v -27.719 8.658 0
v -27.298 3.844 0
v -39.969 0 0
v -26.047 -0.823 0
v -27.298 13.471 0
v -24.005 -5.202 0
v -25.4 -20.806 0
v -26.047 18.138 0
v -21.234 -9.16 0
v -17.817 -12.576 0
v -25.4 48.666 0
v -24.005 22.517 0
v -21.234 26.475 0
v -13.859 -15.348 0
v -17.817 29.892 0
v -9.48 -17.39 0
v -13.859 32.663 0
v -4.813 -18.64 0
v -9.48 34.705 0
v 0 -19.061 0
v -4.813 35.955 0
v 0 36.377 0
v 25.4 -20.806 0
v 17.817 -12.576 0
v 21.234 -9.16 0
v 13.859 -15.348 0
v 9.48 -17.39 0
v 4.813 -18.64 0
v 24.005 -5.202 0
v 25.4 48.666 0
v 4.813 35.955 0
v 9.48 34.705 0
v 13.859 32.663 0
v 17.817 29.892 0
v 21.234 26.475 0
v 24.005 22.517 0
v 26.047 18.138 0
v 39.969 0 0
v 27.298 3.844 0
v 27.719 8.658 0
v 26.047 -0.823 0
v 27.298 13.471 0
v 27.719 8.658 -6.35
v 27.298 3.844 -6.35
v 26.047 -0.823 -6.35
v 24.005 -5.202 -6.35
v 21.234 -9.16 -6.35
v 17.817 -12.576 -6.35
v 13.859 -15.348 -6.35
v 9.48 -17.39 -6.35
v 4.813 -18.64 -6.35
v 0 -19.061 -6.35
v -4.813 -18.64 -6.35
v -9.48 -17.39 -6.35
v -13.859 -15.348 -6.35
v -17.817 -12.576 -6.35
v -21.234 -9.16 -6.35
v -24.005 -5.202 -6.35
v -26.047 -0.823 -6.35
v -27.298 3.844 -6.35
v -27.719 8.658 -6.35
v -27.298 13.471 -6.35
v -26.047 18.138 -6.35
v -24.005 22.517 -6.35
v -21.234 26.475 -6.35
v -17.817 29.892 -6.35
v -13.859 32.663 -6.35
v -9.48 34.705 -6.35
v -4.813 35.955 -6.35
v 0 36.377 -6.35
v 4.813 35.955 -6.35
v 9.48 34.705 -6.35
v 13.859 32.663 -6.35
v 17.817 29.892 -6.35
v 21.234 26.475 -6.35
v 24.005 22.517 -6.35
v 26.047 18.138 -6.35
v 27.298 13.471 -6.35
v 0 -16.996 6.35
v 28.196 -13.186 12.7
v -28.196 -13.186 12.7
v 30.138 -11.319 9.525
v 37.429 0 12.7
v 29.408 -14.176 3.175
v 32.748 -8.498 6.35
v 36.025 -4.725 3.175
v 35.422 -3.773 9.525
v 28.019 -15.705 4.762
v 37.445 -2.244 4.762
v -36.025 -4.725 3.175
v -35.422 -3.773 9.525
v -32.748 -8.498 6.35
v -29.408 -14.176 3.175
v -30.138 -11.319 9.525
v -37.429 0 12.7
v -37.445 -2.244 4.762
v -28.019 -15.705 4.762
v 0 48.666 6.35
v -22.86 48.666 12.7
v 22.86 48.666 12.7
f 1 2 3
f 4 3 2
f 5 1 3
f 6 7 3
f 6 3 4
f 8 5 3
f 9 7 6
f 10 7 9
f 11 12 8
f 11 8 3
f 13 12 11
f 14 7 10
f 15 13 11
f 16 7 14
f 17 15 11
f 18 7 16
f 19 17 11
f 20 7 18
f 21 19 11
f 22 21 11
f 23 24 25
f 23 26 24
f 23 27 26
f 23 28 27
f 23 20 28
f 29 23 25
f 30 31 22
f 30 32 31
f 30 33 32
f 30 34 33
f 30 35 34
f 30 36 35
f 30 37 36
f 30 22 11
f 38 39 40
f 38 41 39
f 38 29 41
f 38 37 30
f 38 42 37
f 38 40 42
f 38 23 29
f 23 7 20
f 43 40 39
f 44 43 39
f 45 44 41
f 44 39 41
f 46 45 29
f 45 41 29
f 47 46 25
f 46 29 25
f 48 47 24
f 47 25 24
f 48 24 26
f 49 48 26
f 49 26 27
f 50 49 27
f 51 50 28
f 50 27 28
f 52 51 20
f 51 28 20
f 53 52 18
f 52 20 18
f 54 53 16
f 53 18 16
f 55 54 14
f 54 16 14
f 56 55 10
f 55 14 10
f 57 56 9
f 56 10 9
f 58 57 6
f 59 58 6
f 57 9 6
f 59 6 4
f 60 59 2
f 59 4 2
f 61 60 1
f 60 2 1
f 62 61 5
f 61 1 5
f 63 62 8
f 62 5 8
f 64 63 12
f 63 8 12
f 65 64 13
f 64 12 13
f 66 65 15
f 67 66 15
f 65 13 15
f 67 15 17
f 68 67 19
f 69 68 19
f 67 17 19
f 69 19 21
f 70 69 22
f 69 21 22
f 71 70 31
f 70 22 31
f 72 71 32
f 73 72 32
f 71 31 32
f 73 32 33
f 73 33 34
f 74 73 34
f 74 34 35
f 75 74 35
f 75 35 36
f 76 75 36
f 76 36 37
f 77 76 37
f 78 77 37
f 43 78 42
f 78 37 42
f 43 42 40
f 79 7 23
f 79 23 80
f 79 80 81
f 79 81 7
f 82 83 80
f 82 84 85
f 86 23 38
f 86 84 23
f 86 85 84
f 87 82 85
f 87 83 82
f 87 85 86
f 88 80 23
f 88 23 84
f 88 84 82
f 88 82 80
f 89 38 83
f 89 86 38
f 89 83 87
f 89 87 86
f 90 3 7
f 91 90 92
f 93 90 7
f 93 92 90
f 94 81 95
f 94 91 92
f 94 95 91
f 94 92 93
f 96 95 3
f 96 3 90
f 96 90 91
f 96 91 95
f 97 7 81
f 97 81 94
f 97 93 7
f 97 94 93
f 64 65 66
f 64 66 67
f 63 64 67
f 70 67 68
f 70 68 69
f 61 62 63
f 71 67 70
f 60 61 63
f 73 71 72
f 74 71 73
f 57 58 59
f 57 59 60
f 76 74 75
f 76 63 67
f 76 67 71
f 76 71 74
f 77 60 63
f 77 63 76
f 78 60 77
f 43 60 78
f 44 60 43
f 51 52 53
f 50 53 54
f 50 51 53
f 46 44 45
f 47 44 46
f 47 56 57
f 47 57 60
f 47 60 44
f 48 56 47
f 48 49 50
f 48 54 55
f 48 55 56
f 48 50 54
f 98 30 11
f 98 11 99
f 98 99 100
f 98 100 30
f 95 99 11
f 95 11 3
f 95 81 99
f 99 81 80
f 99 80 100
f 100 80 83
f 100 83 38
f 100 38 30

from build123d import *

# Parameters (mm, degrees)
F4_R     = 27.7189698501
F5_DEPTH = 6.35


with BuildPart() as f3:
    # F0 (on Top) → F3 section 0
    with BuildSketch(Plane.XY):
        Polygon((-25.4, -20.8064619249), (0, -20.8064619249), (25.4, -20.8064619249), (39.9688414833, 0), (25.4, 48.666095568), (0, 48.666095568), (-25.4, 48.666095568), (-39.9688414833, 0), align=None)
    # F2 (on offset) → F3 section 1
    with BuildSketch(Plane.XY.offset(12.7)):
        Polygon((22.86, 48.6660952), (0, 48.6660952), (-22.86, 48.6660952), (-37.4288413732, 0), (-28.195581331, -13.1864619249), (0, -13.1864619249), (28.1955748, -13.1864619249), (37.4288348422, 0), align=None)
    loft()

    # F4 (on face) → F5 (join)
    with BuildSketch(Plane(origin=(0, 0, 0), x_dir=(1, 0, 0), z_dir=(0, 0, -1))):
        with Locations((0, -8.6576407775)):
            Circle(F4_R)
    extrude(amount=F5_DEPTH)


solid = f3.part
